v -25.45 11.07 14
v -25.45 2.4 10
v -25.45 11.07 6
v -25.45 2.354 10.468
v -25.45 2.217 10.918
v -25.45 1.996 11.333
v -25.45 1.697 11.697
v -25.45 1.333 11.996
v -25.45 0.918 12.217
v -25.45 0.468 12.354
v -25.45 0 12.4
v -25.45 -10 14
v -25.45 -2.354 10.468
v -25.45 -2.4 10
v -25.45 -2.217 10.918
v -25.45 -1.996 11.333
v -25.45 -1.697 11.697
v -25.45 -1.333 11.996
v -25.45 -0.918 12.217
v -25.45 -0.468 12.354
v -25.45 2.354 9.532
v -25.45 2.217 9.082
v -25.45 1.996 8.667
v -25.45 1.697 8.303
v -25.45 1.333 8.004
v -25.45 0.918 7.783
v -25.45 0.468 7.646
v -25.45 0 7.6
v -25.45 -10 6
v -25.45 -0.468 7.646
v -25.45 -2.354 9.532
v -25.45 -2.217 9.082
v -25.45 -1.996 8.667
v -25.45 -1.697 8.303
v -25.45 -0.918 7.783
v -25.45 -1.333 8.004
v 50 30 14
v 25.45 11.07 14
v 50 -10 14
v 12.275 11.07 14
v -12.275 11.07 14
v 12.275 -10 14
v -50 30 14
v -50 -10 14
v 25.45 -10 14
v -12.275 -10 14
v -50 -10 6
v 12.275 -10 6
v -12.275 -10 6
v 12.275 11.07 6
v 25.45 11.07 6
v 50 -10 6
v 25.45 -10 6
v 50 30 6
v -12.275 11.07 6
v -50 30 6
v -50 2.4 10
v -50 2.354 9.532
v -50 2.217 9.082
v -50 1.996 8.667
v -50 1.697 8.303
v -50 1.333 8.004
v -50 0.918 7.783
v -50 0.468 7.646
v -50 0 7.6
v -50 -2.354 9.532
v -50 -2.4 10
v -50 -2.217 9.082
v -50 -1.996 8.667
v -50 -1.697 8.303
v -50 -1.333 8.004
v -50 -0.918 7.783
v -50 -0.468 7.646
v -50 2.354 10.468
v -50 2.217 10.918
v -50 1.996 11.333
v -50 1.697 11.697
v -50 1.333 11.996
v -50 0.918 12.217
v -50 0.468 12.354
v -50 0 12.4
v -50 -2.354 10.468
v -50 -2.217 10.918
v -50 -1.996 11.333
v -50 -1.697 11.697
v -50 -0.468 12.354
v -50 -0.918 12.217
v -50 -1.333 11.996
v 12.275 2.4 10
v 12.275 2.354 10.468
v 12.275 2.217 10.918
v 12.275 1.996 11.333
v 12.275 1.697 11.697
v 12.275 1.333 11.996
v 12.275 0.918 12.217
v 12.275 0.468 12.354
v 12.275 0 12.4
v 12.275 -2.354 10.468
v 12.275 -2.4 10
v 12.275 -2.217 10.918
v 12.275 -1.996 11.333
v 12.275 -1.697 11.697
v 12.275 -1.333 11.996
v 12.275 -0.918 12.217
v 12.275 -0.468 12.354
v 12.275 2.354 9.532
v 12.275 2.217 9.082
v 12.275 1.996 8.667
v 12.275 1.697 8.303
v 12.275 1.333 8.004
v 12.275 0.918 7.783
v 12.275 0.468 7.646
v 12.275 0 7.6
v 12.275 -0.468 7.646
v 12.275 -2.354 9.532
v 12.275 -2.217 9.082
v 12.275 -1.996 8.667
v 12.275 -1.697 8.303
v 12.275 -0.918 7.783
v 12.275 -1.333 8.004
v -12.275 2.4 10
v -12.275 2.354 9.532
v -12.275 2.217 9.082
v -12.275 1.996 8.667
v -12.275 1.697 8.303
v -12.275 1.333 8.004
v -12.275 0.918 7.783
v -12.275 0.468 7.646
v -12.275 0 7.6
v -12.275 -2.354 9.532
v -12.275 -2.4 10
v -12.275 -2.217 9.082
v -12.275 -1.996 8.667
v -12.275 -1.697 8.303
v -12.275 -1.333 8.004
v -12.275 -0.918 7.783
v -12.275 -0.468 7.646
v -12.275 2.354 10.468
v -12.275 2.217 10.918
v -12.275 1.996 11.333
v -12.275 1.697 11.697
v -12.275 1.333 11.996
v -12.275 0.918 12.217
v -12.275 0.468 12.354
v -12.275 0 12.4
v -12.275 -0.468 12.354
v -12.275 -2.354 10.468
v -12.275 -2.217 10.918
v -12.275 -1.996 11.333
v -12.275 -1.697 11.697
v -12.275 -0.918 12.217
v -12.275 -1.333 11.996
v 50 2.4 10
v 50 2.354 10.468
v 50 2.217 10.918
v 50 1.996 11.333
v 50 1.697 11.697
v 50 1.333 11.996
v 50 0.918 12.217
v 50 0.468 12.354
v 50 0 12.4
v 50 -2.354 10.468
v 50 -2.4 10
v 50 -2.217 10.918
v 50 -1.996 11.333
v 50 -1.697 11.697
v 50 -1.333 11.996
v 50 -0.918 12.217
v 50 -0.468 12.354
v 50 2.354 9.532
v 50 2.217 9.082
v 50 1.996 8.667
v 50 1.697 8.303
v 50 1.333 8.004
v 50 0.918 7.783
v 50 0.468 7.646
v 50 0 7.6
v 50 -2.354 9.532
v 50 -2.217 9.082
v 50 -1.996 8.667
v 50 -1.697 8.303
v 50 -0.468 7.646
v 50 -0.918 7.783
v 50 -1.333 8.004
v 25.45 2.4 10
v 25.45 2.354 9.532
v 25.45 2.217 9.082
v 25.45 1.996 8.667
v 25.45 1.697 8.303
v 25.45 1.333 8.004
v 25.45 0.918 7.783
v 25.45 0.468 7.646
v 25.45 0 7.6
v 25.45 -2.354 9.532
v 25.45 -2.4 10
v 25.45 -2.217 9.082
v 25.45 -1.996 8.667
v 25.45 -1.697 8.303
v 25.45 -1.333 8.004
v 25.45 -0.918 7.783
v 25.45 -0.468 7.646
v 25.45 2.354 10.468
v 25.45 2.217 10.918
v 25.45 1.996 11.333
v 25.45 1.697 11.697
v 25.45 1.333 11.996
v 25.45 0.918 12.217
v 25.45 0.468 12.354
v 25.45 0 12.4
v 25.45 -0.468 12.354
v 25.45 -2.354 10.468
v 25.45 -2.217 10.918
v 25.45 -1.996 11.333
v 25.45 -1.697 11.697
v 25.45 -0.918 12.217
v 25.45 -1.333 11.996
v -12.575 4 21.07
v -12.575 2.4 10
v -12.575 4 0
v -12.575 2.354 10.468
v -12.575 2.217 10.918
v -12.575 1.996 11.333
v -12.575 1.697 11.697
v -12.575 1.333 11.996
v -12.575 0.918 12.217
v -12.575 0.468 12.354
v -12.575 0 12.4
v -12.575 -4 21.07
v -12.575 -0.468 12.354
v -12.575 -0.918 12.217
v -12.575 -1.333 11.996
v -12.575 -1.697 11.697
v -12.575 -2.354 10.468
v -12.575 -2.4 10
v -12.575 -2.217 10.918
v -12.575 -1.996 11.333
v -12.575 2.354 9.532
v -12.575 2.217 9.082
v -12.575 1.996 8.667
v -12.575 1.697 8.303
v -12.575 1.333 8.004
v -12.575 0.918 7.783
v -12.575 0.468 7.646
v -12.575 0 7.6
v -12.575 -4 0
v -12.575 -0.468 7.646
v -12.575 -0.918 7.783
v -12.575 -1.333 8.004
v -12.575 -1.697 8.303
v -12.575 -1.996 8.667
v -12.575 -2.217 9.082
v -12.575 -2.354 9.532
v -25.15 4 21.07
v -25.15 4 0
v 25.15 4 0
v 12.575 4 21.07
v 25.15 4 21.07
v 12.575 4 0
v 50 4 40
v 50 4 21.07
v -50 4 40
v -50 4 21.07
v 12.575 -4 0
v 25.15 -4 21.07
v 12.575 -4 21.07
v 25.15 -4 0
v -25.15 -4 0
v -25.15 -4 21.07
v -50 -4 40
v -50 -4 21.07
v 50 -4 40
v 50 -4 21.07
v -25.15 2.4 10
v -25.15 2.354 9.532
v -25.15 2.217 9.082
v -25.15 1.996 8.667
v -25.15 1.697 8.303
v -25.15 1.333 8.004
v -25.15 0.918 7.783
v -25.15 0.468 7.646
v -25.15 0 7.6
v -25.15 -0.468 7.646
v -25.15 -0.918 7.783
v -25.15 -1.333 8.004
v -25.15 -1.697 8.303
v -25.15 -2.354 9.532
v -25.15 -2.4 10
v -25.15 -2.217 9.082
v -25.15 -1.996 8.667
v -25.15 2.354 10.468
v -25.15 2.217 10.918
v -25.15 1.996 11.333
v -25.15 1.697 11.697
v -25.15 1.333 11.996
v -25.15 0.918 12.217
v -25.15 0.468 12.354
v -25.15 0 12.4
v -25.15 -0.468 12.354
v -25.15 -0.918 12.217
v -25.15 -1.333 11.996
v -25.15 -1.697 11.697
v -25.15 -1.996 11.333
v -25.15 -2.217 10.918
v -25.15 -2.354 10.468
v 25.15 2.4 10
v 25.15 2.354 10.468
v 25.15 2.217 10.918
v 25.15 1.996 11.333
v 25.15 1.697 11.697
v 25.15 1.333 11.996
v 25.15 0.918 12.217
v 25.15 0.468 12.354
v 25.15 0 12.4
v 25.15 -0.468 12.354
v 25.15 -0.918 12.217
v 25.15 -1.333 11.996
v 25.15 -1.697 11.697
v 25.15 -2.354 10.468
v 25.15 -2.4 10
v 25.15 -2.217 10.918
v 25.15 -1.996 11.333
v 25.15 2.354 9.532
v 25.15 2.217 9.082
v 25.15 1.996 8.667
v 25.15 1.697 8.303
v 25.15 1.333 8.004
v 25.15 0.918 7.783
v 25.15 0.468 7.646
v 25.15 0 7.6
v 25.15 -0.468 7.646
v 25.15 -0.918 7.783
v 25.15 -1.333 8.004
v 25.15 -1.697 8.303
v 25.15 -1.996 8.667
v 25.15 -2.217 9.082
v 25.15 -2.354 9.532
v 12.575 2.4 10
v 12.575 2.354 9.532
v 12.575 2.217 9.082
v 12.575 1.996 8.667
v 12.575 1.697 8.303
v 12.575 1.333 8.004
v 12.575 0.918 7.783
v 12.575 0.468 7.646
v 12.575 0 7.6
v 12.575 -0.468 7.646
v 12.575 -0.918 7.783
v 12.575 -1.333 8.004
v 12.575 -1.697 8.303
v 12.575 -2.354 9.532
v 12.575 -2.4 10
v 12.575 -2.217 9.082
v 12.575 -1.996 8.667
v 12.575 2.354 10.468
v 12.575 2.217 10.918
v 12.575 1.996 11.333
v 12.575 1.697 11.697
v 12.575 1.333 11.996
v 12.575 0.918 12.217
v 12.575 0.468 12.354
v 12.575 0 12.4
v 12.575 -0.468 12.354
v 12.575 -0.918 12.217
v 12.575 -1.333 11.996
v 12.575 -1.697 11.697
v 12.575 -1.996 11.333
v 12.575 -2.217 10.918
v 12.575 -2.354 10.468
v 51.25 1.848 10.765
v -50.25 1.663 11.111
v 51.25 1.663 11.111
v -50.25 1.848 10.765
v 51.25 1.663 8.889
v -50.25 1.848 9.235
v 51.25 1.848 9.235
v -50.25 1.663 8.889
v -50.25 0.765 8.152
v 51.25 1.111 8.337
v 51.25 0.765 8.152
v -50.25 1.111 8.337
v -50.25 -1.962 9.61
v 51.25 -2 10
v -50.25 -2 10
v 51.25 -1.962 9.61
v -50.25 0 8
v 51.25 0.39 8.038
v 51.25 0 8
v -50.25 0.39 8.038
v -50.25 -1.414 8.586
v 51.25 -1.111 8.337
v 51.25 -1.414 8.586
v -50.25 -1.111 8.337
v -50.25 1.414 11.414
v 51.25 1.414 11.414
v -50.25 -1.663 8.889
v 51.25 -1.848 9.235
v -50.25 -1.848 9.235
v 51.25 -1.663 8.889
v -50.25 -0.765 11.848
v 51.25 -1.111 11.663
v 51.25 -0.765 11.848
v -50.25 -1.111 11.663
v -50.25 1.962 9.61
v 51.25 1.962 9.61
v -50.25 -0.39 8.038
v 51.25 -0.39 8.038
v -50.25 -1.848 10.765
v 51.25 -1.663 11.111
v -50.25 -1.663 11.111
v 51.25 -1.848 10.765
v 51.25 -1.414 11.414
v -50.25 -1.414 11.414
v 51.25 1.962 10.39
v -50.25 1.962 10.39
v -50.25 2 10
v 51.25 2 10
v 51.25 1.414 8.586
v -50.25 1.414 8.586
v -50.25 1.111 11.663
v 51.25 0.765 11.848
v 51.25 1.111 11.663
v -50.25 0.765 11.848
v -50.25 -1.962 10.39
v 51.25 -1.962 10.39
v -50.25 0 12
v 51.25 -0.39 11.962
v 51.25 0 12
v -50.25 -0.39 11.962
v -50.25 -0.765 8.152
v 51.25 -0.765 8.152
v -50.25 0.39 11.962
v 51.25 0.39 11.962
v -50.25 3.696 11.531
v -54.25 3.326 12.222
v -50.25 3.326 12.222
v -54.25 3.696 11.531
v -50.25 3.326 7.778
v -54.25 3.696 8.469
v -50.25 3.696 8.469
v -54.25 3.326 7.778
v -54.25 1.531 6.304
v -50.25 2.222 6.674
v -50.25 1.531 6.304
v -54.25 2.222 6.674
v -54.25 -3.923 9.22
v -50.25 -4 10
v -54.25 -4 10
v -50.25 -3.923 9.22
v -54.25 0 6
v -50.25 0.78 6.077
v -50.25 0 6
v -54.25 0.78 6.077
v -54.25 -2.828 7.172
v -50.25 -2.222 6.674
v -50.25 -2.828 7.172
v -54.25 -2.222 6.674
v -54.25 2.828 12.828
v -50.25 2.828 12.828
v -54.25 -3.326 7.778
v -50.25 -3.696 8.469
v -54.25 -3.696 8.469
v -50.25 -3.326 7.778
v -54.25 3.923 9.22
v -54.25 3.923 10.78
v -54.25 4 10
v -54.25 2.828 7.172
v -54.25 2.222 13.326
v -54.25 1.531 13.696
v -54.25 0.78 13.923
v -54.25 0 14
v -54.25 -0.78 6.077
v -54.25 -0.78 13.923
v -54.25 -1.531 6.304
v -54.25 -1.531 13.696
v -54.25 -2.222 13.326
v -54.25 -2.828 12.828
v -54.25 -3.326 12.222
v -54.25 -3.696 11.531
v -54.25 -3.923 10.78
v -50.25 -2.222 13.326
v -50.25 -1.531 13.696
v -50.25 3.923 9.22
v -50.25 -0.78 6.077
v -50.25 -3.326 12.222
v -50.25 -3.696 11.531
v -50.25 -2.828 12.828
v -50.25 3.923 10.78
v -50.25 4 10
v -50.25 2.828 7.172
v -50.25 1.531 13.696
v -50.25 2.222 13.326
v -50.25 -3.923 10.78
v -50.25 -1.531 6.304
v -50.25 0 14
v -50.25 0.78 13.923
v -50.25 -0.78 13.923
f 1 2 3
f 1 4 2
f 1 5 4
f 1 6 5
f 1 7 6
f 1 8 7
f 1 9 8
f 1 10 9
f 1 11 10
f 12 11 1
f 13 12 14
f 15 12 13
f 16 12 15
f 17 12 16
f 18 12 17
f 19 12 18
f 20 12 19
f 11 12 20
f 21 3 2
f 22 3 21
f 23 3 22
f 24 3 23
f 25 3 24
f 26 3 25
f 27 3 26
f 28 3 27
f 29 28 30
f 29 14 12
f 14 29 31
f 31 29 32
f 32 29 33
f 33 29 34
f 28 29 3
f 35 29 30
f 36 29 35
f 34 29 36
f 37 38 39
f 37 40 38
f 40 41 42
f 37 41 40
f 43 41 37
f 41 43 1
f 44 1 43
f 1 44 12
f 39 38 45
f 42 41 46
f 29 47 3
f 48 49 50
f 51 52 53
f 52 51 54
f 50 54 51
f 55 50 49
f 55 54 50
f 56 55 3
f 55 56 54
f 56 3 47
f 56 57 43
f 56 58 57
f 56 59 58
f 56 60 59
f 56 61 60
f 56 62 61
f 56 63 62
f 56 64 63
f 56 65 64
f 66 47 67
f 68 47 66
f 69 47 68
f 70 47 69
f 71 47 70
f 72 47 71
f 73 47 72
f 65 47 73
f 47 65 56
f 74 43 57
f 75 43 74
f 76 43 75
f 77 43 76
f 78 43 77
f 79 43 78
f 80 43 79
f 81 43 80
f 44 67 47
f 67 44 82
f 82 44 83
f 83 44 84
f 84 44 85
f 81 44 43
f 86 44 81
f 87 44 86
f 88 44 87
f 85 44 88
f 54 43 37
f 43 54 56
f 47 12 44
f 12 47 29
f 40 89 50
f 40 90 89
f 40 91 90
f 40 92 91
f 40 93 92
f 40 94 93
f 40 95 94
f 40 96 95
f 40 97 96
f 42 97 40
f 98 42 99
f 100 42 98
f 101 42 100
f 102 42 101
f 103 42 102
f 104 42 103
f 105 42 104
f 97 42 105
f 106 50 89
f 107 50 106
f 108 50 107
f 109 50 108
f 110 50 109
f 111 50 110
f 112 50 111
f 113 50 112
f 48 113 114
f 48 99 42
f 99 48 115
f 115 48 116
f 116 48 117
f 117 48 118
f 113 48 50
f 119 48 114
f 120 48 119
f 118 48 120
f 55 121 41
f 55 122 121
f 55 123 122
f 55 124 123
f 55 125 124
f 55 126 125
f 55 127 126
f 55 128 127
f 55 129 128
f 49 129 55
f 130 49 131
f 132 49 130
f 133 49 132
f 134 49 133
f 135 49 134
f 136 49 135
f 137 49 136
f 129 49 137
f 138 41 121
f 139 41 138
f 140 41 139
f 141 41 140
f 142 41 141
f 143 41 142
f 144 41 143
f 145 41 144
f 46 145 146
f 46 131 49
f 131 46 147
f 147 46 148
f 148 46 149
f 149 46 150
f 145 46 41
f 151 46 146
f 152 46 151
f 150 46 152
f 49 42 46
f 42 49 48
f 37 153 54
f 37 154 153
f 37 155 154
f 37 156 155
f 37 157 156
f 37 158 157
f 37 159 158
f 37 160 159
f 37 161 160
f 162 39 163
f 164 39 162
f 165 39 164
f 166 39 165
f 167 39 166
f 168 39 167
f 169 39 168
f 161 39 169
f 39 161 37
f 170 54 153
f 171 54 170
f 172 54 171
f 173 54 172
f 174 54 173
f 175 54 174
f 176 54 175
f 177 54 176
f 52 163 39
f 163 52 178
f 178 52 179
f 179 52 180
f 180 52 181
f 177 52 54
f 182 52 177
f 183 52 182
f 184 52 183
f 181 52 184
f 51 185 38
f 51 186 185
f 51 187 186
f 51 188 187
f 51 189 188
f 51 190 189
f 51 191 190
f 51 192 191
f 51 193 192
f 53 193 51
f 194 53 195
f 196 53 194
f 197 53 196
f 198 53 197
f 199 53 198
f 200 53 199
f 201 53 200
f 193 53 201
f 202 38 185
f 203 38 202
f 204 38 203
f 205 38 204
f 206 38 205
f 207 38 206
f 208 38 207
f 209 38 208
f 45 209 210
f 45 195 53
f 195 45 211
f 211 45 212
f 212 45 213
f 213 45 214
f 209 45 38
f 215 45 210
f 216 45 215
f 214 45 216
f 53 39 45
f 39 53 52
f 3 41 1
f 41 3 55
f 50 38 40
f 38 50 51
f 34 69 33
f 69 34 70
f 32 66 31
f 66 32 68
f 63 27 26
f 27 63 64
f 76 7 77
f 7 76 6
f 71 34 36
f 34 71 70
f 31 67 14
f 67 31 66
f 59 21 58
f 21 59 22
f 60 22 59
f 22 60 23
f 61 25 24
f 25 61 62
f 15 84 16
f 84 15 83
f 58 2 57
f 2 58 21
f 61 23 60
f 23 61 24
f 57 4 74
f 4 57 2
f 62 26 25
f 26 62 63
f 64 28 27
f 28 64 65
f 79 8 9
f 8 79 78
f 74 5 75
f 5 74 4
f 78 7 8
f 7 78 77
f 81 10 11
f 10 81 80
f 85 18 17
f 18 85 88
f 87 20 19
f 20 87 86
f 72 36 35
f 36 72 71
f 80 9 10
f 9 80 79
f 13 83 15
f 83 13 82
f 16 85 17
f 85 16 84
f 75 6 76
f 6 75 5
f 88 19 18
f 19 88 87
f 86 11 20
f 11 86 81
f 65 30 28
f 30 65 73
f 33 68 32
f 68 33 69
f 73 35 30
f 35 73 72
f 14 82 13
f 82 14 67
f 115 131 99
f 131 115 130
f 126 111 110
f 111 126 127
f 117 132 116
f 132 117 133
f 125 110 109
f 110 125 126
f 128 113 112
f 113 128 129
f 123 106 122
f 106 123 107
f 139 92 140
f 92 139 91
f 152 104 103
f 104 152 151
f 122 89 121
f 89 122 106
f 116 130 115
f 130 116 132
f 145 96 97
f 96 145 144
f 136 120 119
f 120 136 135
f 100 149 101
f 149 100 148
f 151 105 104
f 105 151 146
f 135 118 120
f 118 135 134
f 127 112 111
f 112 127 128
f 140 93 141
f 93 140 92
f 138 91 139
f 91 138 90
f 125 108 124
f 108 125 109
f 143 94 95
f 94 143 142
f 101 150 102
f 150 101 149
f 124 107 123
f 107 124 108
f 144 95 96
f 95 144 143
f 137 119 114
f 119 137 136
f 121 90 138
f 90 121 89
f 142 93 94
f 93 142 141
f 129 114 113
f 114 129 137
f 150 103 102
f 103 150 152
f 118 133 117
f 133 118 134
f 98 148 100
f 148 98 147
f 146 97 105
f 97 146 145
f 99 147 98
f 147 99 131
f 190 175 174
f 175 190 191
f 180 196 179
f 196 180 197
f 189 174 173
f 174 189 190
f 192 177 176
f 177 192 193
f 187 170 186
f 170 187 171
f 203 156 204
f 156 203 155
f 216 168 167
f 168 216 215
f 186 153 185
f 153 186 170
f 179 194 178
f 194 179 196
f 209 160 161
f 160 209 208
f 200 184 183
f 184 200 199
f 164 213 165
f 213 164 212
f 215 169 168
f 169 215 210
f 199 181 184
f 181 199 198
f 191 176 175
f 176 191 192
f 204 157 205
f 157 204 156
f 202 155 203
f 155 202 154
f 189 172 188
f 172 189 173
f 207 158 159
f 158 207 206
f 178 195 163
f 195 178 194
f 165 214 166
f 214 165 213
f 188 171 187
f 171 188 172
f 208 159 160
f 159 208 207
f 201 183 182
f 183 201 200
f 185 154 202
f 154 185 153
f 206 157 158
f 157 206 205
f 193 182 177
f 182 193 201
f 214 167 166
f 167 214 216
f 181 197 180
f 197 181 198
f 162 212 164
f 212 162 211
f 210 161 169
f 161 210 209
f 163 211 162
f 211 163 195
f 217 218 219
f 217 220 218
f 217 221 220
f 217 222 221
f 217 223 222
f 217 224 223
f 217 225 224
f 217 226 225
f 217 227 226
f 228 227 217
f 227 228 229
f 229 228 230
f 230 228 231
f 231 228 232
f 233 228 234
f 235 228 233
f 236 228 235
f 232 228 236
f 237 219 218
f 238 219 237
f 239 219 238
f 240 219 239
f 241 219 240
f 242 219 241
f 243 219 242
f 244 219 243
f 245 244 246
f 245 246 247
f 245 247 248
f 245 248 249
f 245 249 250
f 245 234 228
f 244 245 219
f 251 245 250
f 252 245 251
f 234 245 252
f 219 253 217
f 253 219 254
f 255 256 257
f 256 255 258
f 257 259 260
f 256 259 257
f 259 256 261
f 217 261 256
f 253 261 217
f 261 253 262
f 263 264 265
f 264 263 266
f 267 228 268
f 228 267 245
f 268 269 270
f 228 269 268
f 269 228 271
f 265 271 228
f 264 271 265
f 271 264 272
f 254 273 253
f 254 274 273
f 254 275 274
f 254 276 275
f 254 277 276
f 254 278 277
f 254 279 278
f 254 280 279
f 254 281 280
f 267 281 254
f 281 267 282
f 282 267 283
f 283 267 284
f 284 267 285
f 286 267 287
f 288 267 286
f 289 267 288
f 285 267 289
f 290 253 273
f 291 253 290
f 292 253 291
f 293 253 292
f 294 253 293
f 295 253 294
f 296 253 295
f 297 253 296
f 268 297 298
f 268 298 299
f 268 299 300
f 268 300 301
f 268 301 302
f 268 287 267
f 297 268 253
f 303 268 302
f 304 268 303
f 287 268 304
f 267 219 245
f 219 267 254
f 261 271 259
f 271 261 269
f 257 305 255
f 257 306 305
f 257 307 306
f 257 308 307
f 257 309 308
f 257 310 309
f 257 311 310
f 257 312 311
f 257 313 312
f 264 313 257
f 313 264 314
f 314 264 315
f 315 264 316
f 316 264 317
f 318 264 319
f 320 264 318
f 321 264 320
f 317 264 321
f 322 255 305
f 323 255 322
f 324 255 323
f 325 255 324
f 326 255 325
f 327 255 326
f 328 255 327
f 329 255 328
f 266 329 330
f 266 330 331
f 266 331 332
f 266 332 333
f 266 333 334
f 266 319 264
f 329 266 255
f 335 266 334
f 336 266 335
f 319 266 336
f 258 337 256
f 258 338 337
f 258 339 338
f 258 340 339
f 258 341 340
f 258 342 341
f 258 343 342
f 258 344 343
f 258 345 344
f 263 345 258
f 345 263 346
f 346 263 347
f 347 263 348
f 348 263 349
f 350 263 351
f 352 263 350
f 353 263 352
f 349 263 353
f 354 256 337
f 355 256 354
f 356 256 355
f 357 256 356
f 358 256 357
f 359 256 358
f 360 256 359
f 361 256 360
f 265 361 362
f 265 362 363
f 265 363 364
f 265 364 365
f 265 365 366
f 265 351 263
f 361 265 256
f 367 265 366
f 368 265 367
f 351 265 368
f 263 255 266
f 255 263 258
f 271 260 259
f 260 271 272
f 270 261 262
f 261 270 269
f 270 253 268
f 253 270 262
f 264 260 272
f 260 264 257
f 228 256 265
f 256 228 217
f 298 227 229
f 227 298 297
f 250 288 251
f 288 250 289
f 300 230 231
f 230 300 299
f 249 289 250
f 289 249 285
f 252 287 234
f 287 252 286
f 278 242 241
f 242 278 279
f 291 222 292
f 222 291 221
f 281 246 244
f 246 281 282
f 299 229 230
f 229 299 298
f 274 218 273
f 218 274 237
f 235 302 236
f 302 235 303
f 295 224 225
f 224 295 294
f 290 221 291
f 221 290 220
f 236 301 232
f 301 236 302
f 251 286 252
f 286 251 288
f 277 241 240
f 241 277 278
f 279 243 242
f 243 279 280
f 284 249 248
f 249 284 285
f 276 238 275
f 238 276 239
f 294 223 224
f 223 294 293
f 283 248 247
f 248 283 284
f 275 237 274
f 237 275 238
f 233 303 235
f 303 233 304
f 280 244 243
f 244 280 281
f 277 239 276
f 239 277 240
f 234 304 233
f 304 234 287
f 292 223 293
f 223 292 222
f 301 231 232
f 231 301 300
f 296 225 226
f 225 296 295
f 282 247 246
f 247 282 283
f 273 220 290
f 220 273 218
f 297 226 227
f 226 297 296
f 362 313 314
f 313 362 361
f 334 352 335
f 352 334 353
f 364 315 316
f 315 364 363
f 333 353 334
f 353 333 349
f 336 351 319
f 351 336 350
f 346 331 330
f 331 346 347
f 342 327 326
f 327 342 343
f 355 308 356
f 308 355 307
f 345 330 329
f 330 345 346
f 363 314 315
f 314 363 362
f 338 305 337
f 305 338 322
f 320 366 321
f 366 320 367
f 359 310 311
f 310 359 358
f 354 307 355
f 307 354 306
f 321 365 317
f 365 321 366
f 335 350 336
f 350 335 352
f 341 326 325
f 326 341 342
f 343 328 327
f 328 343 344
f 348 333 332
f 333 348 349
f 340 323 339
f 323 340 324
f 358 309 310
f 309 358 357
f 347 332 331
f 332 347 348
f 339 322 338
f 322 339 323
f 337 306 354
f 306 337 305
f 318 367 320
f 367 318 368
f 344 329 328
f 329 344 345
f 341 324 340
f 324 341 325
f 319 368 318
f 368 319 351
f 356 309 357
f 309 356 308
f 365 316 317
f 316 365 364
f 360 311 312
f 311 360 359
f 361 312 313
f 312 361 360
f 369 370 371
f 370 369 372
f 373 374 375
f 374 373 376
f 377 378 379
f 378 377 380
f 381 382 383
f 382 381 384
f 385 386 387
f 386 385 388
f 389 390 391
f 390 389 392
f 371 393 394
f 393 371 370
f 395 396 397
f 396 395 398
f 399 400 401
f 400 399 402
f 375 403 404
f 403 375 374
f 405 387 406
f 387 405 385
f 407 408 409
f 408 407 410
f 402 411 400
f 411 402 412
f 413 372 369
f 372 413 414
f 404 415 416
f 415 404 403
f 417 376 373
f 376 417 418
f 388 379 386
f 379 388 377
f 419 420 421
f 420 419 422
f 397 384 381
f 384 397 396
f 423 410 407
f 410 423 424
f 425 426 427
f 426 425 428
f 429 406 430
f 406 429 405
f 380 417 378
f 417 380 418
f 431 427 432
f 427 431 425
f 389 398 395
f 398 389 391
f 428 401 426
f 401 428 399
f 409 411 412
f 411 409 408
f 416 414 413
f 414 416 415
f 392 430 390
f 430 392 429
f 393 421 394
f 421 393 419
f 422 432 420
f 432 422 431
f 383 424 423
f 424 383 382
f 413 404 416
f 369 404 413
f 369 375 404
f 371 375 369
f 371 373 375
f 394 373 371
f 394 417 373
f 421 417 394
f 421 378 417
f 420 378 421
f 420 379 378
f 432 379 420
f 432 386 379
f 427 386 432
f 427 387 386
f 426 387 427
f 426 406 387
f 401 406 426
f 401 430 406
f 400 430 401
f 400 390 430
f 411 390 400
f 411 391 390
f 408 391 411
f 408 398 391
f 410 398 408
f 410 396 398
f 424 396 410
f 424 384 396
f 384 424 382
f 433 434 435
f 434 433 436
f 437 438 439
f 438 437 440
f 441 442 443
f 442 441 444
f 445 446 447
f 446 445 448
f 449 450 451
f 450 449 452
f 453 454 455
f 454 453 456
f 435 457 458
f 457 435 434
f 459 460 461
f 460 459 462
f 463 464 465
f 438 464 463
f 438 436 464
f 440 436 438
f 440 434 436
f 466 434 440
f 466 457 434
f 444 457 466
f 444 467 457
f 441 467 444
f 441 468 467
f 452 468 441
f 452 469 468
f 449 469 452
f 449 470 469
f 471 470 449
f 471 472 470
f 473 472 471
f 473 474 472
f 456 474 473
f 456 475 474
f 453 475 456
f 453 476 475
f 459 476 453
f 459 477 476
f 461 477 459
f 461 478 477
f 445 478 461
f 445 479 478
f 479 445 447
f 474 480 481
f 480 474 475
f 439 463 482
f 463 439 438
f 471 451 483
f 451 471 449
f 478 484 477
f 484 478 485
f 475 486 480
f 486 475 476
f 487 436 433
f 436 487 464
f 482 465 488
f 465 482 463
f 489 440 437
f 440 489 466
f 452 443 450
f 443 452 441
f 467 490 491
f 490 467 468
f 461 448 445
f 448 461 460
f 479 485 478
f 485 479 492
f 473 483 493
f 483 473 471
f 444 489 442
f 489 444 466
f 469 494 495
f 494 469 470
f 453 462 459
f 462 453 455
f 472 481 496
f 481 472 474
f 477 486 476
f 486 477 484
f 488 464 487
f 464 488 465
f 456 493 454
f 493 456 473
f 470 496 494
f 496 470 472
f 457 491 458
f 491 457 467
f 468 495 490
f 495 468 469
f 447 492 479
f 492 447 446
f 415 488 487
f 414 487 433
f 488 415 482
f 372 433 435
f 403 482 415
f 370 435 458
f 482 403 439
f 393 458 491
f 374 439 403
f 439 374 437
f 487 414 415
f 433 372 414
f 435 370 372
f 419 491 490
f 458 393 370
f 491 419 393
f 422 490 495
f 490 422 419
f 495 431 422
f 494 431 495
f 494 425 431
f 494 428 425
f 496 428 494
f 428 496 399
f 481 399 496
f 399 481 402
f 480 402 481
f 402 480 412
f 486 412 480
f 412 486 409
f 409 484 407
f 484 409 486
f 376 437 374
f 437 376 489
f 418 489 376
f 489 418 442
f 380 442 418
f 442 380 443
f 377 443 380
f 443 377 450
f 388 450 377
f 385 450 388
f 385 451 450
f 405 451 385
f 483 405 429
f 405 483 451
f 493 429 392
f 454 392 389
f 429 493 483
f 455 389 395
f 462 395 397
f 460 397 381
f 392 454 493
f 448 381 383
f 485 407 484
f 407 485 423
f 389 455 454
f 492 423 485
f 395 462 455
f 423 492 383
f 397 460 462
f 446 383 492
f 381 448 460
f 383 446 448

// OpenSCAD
$fn = 32;

// ------------------------------------------------------------------------
// Butt hinge: hinge 100 mm, leaf swung 270 deg
// Every part is its own module, assembly() places every instance.
// ------------------------------------------------------------------------

// --- part 1 ---
module hinge_base() {
  difference() {
    union() {
      translate([-50, -10, -4]) cube([24.55, 40, 8]);
      translate([-12.275, -10, -4]) cube([24.55, 40, 8]);
      translate([25.45, -10, -4]) cube([24.55, 40, 8]);
      translate([-50, 11.07, -4]) cube([100, 18.93, 8]);
    }
    translate([-37.725, 0, 0]) rotate([0, 90, 0]) cylinder(h = 26.55, d = 4.8, center = true);
    translate([0, 0, 0]) rotate([0, 90, 0]) cylinder(h = 26.55, d = 4.8, center = true);
    translate([37.725, 0, 0]) rotate([0, 90, 0]) cylinder(h = 26.55, d = 4.8, center = true);
  }
}

// --- part 2 ---
module hinge_mover() {
  difference() {
    union() {
      translate([-25.15, -30, -4]) cube([12.575, 40, 8]);
      translate([12.575, -30, -4]) cube([12.575, 40, 8]);
      translate([-50, -30, -4]) cube([100, 18.93, 8]);
    }
    translate([-18.863, 0, 0]) rotate([0, 90, 0]) cylinder(h = 14.575, d = 4.8, center = true);
    translate([18.863, 0, 0]) rotate([0, 90, 0]) cylinder(h = 14.575, d = 4.8, center = true);
  }
}

// --- part 3 ---
module hinge_pin() {
  rotate([0, 90, 0]) cylinder(h = 102.5, d = 4, center = true);
  translate([-54.25, 0, 0]) rotate([0, 90, 0]) cylinder(h = 4, d = 8);
}

// --- assembly ---
module assembly() {
  color([0.80, 0.24, 0.20]) translate([0, 0, 10]) rotate([0, 0, 0]) hinge_base();
  color([0.20, 0.45, 0.75]) translate([0, 0, 10]) rotate([270, 0, 0]) hinge_mover();
  color([0.25, 0.62, 0.32]) translate([0, 0, 10]) rotate([0, 0, 0]) hinge_pin();
}

assembly();
